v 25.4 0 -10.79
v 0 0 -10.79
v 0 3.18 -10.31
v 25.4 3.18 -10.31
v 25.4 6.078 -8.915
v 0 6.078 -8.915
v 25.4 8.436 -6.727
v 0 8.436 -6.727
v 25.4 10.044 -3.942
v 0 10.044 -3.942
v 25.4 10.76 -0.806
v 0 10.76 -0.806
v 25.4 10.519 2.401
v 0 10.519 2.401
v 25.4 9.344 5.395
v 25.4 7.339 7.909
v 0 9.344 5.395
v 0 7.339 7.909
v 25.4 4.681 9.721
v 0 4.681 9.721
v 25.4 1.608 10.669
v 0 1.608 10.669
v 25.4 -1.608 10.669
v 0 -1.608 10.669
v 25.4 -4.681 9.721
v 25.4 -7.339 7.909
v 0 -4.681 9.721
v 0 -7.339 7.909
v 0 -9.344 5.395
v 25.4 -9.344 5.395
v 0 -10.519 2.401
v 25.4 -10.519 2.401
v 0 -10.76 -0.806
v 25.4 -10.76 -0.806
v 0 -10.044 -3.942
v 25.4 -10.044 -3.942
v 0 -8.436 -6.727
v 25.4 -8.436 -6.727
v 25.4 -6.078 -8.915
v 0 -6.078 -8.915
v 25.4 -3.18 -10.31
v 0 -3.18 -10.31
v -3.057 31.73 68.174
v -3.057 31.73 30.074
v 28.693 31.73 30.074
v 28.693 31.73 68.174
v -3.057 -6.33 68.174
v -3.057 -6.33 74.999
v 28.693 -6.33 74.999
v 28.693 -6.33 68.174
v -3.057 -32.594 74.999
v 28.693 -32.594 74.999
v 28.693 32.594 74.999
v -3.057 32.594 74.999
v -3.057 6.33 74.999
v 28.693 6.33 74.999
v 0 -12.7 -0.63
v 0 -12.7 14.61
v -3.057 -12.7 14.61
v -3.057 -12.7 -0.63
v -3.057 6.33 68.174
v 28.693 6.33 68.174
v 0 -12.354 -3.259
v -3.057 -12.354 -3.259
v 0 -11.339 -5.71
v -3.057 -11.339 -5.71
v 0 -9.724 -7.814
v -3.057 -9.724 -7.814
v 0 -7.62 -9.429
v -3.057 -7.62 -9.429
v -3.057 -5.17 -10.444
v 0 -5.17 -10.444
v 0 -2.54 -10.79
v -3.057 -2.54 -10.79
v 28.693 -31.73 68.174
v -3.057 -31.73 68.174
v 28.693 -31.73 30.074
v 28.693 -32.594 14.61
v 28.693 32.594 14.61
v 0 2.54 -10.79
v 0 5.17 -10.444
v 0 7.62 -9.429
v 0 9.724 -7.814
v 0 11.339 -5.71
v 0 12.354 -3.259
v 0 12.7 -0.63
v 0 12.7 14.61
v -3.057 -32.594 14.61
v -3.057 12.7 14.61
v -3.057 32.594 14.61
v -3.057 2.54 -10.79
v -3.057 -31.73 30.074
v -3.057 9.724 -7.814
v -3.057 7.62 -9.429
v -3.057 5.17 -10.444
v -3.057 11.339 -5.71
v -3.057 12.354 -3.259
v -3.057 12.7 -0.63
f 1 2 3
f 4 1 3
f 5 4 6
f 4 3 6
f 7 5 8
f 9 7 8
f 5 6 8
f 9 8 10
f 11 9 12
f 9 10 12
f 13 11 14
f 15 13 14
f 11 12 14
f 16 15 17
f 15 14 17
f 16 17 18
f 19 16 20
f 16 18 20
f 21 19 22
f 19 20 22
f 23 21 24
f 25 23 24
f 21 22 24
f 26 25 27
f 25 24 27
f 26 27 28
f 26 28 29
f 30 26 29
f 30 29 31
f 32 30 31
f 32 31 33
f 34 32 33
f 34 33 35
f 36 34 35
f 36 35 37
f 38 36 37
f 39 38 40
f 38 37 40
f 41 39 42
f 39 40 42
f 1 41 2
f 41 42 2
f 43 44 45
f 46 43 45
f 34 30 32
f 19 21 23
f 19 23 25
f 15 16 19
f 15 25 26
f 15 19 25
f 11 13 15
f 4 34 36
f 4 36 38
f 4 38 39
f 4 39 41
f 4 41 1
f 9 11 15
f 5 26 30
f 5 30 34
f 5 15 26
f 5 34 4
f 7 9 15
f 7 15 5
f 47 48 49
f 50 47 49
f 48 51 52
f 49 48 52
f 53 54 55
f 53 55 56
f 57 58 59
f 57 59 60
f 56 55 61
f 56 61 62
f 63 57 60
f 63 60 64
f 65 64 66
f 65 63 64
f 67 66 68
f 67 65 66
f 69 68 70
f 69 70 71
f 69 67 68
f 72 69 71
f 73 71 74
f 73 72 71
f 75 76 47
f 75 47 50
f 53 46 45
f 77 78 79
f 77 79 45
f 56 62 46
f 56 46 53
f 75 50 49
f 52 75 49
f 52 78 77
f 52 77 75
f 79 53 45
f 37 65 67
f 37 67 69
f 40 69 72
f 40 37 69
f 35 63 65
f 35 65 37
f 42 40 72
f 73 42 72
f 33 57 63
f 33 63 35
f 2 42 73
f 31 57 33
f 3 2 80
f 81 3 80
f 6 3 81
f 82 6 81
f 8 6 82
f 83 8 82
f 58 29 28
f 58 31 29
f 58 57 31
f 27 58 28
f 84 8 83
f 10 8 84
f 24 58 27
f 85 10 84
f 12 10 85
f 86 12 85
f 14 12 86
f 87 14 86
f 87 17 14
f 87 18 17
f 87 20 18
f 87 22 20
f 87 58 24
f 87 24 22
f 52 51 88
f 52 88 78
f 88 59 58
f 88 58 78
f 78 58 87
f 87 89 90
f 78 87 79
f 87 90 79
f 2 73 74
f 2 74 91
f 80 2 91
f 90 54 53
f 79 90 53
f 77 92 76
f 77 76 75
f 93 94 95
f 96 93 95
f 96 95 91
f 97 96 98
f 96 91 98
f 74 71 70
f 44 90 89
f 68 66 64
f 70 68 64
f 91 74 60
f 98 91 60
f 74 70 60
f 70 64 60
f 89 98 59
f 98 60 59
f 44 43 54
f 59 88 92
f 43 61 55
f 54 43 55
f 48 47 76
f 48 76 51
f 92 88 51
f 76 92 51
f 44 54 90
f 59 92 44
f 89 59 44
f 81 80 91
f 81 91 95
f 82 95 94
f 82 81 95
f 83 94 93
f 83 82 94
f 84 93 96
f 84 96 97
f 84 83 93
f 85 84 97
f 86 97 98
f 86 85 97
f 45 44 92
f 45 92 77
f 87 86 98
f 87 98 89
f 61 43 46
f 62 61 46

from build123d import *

# Parameters (mm, degrees)
SKETCH1_R           = 10.789707568
BOSS_EXTRUDE1_DEPTH = 25.4
BOSS_EXTRUDE2_DEPTH = 3.056759297
SKETCH3_W           = 31.75
SKETCH3_H           = 65.18759886
BOSS_EXTRUDE3_DEPTH = 15.463355349
SKETCH4_W           = 31.75
SKETCH4_H           = 0.86411943
BOSS_EXTRUDE4_DEPTH = 44.925321362
SKETCH5_W           = 31.75
SKETCH5_H           = 6.825321362
BOSS_EXTRUDE5_DEPTH = 25.4


with BuildPart() as part:
    # Sketch1 → Boss-Extrude1 (new body)
    with BuildSketch(Plane.YZ):
        Circle(SKETCH1_R)
    extrude(amount=BOSS_EXTRUDE1_DEPTH)

    # Sketch2 → Boss-Extrude2 (add)
    with BuildSketch(Plane(origin=(0, 0, 0), x_dir=(0, -1, 0), z_dir=(-1, 0, 0))):
        with BuildLine():
            Line((2.54, -10.789707568), (-2.54, -10.789707568))
            ThreePointArc((-2.54, -10.789707568), (-9.724204897, -7.813912465), (-12.7, -0.629707568))
            Line((-12.7, -0.629707568), (-12.7, 14.610292432))
            Line((-12.7, 14.610292432), (12.7, 14.610292432))
            Line((12.7, 14.610292432), (12.7, -0.629707568))
            ThreePointArc((12.7, -0.629707568), (9.724204897, -7.813912465), (2.54, -10.789707568))
        make_face()
    extrude(amount=BOSS_EXTRUDE2_DEPTH)

    # Sketch3 → Boss-Extrude3 (add)
    with BuildSketch(Plane.XY.offset(14.610292432)):
        with Locations((12.818240703, 0)):
            Rectangle(SKETCH3_W, SKETCH3_H)
    extrude(amount=BOSS_EXTRUDE3_DEPTH)


with BuildPart() as body_2:
    # Sketch4 → Boss-Extrude4 (new body)
    with BuildSketch(Plane.XY.offset(30.073647781)):
        with Locations((12.818240703, 32.161739715)):
            Rectangle(SKETCH4_W, SKETCH4_H)
    extrude(amount=BOSS_EXTRUDE4_DEPTH)

    # Sketch5 → Boss-Extrude5 (add)
    with BuildSketch(Plane.XZ.offset(-31.72968)):
        with Locations((12.818240703, 71.586308462)):
            Rectangle(SKETCH5_W, SKETCH5_H)
    extrude(amount=BOSS_EXTRUDE5_DEPTH)


with BuildPart() as body_3:
    # Mirror1: mirrored copy
    add(body_2.part.mirror(Plane.ZX))


with BuildPart() as body_2_1:
    add(body_2.part)

    # Combine1: union part, body 3
    add(part.part)
    add(body_3.part)


solid = body_2_1.part
